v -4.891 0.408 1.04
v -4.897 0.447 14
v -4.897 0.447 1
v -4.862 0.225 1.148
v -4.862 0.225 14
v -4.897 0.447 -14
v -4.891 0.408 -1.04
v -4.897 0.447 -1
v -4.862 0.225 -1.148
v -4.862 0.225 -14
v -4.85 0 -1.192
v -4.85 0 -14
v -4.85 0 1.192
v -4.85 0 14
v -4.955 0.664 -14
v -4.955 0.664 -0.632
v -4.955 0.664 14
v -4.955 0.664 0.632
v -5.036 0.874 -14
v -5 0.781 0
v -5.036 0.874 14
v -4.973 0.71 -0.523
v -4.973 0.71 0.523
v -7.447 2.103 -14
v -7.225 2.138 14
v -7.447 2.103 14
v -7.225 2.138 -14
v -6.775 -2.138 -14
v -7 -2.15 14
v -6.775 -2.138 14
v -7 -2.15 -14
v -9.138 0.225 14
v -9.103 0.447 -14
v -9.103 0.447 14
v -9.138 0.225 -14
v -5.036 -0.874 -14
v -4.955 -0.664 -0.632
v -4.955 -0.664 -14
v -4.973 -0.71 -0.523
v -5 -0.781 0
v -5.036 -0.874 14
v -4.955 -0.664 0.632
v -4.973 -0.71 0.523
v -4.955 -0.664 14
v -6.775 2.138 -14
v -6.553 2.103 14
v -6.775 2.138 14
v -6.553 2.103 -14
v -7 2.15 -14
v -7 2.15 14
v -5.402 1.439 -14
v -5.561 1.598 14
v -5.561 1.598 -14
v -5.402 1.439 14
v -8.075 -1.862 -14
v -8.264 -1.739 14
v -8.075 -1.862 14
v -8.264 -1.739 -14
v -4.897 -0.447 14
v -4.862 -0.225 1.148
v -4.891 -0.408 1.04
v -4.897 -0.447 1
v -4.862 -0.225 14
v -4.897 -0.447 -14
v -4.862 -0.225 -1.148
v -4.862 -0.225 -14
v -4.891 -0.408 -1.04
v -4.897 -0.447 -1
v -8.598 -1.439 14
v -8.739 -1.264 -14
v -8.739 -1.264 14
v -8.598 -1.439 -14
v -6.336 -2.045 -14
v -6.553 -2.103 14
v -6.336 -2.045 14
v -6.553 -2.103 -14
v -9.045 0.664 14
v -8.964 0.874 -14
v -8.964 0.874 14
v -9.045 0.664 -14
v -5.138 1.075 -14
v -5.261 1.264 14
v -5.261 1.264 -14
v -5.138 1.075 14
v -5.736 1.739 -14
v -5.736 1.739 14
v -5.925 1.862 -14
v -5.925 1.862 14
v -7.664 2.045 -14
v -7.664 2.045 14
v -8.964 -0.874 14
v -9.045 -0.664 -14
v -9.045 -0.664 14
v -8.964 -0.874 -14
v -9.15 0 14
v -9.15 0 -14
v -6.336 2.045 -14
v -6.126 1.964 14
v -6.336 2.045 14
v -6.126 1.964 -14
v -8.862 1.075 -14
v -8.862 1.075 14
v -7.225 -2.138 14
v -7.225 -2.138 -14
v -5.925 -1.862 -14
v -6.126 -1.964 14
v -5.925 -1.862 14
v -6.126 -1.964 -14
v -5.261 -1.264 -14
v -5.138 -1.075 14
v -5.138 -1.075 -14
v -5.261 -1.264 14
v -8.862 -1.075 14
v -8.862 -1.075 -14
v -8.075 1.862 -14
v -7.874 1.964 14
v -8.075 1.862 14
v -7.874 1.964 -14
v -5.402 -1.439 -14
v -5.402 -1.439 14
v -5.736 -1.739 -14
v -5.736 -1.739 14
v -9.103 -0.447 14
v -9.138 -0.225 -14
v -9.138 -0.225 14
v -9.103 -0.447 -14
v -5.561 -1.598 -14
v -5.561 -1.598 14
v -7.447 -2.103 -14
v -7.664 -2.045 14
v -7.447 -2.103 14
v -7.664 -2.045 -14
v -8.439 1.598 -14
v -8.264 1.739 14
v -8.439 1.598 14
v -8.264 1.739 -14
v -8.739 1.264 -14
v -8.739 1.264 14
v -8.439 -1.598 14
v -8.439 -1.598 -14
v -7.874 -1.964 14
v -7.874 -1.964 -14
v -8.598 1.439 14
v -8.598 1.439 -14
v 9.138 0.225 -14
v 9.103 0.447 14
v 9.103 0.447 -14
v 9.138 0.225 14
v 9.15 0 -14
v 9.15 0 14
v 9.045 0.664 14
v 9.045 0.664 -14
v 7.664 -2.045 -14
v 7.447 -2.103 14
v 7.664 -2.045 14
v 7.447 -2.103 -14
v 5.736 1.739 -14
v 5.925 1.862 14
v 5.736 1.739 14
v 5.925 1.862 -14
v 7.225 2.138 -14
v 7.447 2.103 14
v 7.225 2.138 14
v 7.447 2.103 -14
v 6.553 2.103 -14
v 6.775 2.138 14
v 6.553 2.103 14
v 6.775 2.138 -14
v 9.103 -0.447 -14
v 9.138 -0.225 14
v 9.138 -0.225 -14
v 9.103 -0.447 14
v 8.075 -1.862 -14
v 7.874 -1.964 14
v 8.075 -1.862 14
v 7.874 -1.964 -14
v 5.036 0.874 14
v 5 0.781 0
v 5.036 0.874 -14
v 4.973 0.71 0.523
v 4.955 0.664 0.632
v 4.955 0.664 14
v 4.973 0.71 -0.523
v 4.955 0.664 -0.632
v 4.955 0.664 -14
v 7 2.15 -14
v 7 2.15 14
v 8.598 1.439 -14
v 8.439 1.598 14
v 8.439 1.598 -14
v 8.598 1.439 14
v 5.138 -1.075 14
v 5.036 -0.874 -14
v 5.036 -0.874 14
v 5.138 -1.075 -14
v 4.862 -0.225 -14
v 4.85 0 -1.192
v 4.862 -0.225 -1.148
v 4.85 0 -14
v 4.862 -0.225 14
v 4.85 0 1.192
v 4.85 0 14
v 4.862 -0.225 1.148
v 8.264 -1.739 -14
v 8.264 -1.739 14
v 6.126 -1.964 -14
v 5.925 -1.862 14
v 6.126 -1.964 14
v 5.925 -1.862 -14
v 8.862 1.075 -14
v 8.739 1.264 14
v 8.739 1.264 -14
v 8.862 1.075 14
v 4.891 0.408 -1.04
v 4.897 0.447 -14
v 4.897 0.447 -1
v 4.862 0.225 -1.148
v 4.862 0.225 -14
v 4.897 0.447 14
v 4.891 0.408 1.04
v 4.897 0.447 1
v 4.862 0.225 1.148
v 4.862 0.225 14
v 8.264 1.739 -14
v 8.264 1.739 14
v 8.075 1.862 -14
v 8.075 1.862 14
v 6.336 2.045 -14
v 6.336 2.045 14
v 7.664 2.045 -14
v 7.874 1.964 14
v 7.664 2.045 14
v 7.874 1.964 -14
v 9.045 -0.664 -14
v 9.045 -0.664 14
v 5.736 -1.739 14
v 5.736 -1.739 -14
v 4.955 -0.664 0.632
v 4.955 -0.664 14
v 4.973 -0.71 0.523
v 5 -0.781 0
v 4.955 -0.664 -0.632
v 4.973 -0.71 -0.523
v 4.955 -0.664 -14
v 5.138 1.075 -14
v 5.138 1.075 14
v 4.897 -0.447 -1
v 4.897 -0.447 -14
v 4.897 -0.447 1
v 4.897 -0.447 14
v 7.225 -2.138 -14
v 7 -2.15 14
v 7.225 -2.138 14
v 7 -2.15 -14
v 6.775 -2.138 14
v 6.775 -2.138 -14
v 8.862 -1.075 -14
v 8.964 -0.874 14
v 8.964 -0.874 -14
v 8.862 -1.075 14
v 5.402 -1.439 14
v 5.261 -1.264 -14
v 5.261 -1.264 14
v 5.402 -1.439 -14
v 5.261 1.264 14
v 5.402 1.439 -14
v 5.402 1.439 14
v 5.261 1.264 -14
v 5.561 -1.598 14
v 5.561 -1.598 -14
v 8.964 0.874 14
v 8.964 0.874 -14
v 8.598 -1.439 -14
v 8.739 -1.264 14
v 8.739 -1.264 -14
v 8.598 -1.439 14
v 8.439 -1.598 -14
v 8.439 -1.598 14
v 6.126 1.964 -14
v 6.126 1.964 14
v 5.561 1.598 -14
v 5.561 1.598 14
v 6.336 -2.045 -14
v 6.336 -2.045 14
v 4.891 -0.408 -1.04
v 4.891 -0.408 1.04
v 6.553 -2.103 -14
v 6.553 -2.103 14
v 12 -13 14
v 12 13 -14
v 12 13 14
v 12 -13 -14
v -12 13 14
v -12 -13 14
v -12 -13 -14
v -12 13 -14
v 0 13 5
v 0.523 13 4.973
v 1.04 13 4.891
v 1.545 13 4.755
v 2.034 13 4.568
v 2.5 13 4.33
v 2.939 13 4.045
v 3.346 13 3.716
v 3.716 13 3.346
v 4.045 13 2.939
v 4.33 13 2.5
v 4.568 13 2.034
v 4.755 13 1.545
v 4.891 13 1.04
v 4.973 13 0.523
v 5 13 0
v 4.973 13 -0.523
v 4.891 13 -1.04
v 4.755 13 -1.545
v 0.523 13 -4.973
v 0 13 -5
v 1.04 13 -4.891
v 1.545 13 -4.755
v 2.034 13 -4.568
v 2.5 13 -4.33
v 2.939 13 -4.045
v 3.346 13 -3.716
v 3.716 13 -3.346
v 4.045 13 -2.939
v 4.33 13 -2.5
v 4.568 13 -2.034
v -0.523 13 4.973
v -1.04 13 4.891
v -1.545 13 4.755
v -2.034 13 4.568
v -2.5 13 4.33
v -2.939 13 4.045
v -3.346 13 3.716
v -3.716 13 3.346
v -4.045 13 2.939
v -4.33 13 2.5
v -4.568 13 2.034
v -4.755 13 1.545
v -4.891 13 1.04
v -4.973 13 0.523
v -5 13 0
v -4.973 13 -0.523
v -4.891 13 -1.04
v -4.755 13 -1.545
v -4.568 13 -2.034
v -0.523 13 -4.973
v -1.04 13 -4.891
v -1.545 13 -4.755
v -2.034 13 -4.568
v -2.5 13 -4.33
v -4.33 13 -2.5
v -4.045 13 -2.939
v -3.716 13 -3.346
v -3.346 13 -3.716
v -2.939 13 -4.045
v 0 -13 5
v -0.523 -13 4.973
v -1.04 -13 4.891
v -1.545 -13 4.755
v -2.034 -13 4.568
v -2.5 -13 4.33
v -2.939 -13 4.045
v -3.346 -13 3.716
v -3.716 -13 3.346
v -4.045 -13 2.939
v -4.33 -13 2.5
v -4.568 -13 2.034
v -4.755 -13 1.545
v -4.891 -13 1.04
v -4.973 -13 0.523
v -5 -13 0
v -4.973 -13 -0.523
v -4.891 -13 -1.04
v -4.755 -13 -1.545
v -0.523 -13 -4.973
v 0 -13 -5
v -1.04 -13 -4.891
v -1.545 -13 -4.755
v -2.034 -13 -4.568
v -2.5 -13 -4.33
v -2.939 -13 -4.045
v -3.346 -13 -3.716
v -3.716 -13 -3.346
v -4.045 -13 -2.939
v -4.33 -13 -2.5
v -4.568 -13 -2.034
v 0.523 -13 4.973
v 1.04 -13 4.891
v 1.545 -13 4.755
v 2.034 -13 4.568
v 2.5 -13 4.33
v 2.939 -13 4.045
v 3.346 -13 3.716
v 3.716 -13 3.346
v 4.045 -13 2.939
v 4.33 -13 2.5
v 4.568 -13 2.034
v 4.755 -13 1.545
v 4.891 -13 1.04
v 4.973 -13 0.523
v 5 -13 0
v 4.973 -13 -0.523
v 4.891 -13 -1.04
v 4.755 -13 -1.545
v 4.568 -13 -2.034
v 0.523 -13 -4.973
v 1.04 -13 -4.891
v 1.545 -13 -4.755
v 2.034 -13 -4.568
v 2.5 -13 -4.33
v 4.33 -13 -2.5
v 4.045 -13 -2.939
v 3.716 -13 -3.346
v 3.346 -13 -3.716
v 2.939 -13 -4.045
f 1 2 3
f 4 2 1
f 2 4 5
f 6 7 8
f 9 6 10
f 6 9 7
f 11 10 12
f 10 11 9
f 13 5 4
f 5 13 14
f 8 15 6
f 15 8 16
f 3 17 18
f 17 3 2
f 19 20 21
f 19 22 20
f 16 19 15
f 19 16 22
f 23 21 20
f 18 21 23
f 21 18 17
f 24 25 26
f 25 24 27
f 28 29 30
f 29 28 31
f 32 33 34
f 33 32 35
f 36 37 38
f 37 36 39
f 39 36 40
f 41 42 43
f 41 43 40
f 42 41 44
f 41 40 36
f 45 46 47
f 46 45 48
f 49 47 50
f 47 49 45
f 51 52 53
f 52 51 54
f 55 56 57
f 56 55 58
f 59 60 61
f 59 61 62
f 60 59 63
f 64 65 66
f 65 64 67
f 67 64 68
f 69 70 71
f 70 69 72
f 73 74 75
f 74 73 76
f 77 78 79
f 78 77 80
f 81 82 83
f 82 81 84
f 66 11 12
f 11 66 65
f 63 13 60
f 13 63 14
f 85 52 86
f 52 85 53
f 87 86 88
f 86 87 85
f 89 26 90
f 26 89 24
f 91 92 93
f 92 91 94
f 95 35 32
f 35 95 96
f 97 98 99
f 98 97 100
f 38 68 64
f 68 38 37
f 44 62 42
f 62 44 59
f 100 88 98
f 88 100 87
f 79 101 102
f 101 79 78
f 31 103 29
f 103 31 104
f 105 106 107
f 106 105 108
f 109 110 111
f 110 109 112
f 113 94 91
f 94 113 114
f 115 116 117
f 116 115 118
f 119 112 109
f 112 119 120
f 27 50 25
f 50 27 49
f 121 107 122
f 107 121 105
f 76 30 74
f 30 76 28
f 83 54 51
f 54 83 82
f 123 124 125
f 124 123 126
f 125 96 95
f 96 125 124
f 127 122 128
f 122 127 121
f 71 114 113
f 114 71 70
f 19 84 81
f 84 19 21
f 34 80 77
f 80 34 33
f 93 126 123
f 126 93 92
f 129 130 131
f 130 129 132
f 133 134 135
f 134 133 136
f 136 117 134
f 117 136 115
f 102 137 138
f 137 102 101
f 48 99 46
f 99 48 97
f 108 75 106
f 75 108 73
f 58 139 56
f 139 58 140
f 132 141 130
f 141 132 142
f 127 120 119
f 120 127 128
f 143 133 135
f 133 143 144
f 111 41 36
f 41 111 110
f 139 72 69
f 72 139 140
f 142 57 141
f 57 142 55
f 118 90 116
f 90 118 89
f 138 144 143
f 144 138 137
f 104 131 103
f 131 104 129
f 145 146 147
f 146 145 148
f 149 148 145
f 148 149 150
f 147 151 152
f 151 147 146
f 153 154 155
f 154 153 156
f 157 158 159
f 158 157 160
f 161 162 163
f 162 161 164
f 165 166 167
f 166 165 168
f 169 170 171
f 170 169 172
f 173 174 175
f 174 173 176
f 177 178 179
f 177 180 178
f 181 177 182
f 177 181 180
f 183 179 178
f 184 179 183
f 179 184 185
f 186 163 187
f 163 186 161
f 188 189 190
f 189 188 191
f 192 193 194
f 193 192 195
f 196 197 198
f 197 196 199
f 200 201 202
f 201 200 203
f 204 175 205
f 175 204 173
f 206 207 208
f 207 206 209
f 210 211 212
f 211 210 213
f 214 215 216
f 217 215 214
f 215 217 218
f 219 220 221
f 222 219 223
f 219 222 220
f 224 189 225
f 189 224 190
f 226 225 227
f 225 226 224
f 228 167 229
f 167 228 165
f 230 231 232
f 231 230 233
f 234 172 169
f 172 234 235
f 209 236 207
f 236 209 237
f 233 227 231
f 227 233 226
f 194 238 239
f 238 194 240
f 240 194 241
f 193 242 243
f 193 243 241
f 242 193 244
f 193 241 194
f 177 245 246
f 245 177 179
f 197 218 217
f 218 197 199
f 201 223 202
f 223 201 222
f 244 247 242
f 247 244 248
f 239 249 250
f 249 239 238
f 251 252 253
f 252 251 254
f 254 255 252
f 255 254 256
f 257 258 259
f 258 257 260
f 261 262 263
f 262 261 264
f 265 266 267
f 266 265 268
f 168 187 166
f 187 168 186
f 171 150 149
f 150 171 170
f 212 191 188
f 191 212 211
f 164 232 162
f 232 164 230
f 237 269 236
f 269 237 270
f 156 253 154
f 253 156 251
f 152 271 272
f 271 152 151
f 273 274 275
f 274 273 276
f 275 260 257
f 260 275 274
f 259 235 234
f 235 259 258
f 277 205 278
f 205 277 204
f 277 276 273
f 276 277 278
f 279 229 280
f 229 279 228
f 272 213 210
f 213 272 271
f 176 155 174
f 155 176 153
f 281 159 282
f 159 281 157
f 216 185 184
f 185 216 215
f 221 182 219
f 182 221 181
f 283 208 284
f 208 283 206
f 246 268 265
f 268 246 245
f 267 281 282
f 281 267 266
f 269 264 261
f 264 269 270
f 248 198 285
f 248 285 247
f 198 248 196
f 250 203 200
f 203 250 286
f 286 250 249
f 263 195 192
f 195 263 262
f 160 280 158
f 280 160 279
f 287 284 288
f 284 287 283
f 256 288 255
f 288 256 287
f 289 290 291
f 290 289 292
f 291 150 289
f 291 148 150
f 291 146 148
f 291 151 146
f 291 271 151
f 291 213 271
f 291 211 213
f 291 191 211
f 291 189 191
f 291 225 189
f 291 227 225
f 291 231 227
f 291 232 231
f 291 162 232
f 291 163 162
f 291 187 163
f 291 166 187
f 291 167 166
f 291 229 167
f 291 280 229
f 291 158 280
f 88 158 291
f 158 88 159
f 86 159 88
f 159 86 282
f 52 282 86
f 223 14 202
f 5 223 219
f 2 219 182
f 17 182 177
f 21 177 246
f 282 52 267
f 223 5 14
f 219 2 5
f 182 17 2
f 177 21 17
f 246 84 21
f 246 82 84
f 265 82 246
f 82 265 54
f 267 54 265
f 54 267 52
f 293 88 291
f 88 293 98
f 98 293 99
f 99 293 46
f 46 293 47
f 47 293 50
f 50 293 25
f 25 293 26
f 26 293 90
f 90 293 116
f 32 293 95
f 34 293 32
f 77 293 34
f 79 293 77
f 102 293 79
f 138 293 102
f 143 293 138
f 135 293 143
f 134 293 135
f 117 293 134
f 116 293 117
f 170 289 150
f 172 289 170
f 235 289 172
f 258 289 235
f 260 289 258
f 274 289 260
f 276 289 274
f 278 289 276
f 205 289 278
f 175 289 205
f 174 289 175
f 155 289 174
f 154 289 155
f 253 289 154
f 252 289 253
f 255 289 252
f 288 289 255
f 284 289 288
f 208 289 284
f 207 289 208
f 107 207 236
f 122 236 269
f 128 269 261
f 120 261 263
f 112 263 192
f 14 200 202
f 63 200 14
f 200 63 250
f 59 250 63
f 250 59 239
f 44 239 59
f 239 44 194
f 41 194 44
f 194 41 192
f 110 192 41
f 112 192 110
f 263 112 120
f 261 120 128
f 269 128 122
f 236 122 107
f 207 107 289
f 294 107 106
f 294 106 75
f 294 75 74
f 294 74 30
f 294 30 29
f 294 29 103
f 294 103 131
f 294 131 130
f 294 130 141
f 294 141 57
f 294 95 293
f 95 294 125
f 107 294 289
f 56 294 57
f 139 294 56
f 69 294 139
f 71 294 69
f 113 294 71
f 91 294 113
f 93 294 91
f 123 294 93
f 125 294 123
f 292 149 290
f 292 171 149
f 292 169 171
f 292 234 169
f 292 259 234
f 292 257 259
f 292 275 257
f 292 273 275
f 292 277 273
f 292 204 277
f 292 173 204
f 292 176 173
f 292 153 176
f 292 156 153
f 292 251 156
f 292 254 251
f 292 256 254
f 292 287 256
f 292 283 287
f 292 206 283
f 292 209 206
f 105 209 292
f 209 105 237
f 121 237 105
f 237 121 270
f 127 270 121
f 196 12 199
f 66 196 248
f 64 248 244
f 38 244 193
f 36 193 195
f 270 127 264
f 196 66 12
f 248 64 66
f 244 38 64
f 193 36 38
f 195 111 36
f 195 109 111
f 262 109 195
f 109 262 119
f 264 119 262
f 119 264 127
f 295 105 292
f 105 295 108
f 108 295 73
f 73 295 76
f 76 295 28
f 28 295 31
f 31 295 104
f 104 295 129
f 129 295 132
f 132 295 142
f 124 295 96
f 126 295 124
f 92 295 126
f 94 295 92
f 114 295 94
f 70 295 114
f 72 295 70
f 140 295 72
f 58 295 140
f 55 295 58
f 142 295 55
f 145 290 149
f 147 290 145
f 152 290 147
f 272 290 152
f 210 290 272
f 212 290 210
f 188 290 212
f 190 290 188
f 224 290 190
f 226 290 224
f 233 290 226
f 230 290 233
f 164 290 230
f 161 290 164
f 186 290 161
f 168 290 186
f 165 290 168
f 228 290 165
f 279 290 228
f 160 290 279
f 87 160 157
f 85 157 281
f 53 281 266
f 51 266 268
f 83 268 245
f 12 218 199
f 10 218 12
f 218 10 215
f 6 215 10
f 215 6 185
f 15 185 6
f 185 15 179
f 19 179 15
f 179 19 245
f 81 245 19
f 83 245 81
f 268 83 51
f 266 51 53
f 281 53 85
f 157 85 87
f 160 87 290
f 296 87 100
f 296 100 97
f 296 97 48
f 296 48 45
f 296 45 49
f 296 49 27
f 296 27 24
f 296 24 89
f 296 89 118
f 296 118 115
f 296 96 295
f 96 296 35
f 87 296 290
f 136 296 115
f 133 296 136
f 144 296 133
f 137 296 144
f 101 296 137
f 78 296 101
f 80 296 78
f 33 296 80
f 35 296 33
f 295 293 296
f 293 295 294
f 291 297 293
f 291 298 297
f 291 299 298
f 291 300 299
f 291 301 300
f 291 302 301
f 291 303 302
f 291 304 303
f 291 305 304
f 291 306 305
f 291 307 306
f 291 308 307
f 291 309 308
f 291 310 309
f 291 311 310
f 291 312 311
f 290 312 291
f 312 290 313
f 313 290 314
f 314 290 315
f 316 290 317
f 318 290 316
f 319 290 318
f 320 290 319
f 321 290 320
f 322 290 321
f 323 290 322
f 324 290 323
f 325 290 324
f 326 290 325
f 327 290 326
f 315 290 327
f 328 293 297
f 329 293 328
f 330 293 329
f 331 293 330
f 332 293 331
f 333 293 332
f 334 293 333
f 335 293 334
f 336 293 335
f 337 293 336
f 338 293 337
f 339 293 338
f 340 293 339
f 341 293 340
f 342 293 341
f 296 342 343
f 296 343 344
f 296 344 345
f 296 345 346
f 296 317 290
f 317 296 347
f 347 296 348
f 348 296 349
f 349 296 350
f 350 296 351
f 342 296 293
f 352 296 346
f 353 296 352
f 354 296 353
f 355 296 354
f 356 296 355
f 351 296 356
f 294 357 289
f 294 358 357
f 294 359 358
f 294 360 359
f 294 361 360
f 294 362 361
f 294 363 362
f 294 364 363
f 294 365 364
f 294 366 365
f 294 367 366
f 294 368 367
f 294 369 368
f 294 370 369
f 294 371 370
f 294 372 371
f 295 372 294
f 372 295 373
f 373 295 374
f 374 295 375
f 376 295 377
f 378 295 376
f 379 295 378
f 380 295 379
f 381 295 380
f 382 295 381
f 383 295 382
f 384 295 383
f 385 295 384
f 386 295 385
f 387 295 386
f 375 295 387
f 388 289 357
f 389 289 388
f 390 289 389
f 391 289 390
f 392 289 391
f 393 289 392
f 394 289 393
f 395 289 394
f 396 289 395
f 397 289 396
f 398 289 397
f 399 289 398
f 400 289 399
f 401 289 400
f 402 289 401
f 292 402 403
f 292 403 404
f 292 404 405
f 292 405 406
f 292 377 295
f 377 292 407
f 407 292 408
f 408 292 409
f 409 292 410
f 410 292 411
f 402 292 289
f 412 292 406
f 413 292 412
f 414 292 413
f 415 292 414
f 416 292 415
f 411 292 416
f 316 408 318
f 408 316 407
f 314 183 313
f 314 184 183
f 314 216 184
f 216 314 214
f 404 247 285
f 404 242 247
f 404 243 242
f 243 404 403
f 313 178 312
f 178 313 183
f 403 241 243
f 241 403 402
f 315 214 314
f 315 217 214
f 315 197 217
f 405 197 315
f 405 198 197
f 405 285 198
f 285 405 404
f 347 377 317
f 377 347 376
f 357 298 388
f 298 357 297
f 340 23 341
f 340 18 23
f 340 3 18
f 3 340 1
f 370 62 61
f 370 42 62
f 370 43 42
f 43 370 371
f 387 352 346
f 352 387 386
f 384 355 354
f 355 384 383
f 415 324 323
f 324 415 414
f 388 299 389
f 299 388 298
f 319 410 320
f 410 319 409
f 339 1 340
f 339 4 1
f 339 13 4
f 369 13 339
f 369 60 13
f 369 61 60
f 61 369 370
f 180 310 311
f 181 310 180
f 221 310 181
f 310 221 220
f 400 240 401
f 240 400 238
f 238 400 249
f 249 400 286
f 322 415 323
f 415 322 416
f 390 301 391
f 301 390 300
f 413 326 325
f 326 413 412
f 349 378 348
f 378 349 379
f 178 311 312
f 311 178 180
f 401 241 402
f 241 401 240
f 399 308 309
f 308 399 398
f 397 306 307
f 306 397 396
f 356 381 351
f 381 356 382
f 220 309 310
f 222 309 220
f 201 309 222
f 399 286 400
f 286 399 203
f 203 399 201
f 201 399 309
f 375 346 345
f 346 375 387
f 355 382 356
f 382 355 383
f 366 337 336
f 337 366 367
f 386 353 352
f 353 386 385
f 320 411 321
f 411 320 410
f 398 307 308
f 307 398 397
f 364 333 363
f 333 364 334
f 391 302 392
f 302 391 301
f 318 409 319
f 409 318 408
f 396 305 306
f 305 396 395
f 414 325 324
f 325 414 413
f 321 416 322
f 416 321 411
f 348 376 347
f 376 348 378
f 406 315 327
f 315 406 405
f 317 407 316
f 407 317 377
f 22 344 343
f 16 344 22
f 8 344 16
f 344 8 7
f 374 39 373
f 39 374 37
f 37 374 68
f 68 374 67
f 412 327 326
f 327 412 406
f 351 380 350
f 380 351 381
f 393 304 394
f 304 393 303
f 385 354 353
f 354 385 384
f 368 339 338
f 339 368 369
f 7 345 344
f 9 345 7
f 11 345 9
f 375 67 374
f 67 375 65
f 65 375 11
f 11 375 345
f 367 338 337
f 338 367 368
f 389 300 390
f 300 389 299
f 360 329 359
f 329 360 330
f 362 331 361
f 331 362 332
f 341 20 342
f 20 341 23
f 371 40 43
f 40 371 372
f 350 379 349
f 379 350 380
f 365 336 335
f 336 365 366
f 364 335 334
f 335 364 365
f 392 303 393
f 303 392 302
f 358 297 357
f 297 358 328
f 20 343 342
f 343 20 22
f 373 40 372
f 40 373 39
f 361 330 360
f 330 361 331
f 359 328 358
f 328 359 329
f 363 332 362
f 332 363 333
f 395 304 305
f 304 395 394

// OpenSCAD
// Linear rail stop block.
$fn = 60;
eps = 0.02;
width = 26;
height = 28;
bore_d = 10;
length = 24;
difference() {
    cube([length,width,height],center=true);
    translate([0,-width/2-eps,0]) rotate([-90,0,0]) cylinder(d=bore_d,h=width+2*eps);
    for(x=[-7,7]) translate([x,0,-height/2-eps]) cylinder(d=4.3,h=height+2*eps);
}
